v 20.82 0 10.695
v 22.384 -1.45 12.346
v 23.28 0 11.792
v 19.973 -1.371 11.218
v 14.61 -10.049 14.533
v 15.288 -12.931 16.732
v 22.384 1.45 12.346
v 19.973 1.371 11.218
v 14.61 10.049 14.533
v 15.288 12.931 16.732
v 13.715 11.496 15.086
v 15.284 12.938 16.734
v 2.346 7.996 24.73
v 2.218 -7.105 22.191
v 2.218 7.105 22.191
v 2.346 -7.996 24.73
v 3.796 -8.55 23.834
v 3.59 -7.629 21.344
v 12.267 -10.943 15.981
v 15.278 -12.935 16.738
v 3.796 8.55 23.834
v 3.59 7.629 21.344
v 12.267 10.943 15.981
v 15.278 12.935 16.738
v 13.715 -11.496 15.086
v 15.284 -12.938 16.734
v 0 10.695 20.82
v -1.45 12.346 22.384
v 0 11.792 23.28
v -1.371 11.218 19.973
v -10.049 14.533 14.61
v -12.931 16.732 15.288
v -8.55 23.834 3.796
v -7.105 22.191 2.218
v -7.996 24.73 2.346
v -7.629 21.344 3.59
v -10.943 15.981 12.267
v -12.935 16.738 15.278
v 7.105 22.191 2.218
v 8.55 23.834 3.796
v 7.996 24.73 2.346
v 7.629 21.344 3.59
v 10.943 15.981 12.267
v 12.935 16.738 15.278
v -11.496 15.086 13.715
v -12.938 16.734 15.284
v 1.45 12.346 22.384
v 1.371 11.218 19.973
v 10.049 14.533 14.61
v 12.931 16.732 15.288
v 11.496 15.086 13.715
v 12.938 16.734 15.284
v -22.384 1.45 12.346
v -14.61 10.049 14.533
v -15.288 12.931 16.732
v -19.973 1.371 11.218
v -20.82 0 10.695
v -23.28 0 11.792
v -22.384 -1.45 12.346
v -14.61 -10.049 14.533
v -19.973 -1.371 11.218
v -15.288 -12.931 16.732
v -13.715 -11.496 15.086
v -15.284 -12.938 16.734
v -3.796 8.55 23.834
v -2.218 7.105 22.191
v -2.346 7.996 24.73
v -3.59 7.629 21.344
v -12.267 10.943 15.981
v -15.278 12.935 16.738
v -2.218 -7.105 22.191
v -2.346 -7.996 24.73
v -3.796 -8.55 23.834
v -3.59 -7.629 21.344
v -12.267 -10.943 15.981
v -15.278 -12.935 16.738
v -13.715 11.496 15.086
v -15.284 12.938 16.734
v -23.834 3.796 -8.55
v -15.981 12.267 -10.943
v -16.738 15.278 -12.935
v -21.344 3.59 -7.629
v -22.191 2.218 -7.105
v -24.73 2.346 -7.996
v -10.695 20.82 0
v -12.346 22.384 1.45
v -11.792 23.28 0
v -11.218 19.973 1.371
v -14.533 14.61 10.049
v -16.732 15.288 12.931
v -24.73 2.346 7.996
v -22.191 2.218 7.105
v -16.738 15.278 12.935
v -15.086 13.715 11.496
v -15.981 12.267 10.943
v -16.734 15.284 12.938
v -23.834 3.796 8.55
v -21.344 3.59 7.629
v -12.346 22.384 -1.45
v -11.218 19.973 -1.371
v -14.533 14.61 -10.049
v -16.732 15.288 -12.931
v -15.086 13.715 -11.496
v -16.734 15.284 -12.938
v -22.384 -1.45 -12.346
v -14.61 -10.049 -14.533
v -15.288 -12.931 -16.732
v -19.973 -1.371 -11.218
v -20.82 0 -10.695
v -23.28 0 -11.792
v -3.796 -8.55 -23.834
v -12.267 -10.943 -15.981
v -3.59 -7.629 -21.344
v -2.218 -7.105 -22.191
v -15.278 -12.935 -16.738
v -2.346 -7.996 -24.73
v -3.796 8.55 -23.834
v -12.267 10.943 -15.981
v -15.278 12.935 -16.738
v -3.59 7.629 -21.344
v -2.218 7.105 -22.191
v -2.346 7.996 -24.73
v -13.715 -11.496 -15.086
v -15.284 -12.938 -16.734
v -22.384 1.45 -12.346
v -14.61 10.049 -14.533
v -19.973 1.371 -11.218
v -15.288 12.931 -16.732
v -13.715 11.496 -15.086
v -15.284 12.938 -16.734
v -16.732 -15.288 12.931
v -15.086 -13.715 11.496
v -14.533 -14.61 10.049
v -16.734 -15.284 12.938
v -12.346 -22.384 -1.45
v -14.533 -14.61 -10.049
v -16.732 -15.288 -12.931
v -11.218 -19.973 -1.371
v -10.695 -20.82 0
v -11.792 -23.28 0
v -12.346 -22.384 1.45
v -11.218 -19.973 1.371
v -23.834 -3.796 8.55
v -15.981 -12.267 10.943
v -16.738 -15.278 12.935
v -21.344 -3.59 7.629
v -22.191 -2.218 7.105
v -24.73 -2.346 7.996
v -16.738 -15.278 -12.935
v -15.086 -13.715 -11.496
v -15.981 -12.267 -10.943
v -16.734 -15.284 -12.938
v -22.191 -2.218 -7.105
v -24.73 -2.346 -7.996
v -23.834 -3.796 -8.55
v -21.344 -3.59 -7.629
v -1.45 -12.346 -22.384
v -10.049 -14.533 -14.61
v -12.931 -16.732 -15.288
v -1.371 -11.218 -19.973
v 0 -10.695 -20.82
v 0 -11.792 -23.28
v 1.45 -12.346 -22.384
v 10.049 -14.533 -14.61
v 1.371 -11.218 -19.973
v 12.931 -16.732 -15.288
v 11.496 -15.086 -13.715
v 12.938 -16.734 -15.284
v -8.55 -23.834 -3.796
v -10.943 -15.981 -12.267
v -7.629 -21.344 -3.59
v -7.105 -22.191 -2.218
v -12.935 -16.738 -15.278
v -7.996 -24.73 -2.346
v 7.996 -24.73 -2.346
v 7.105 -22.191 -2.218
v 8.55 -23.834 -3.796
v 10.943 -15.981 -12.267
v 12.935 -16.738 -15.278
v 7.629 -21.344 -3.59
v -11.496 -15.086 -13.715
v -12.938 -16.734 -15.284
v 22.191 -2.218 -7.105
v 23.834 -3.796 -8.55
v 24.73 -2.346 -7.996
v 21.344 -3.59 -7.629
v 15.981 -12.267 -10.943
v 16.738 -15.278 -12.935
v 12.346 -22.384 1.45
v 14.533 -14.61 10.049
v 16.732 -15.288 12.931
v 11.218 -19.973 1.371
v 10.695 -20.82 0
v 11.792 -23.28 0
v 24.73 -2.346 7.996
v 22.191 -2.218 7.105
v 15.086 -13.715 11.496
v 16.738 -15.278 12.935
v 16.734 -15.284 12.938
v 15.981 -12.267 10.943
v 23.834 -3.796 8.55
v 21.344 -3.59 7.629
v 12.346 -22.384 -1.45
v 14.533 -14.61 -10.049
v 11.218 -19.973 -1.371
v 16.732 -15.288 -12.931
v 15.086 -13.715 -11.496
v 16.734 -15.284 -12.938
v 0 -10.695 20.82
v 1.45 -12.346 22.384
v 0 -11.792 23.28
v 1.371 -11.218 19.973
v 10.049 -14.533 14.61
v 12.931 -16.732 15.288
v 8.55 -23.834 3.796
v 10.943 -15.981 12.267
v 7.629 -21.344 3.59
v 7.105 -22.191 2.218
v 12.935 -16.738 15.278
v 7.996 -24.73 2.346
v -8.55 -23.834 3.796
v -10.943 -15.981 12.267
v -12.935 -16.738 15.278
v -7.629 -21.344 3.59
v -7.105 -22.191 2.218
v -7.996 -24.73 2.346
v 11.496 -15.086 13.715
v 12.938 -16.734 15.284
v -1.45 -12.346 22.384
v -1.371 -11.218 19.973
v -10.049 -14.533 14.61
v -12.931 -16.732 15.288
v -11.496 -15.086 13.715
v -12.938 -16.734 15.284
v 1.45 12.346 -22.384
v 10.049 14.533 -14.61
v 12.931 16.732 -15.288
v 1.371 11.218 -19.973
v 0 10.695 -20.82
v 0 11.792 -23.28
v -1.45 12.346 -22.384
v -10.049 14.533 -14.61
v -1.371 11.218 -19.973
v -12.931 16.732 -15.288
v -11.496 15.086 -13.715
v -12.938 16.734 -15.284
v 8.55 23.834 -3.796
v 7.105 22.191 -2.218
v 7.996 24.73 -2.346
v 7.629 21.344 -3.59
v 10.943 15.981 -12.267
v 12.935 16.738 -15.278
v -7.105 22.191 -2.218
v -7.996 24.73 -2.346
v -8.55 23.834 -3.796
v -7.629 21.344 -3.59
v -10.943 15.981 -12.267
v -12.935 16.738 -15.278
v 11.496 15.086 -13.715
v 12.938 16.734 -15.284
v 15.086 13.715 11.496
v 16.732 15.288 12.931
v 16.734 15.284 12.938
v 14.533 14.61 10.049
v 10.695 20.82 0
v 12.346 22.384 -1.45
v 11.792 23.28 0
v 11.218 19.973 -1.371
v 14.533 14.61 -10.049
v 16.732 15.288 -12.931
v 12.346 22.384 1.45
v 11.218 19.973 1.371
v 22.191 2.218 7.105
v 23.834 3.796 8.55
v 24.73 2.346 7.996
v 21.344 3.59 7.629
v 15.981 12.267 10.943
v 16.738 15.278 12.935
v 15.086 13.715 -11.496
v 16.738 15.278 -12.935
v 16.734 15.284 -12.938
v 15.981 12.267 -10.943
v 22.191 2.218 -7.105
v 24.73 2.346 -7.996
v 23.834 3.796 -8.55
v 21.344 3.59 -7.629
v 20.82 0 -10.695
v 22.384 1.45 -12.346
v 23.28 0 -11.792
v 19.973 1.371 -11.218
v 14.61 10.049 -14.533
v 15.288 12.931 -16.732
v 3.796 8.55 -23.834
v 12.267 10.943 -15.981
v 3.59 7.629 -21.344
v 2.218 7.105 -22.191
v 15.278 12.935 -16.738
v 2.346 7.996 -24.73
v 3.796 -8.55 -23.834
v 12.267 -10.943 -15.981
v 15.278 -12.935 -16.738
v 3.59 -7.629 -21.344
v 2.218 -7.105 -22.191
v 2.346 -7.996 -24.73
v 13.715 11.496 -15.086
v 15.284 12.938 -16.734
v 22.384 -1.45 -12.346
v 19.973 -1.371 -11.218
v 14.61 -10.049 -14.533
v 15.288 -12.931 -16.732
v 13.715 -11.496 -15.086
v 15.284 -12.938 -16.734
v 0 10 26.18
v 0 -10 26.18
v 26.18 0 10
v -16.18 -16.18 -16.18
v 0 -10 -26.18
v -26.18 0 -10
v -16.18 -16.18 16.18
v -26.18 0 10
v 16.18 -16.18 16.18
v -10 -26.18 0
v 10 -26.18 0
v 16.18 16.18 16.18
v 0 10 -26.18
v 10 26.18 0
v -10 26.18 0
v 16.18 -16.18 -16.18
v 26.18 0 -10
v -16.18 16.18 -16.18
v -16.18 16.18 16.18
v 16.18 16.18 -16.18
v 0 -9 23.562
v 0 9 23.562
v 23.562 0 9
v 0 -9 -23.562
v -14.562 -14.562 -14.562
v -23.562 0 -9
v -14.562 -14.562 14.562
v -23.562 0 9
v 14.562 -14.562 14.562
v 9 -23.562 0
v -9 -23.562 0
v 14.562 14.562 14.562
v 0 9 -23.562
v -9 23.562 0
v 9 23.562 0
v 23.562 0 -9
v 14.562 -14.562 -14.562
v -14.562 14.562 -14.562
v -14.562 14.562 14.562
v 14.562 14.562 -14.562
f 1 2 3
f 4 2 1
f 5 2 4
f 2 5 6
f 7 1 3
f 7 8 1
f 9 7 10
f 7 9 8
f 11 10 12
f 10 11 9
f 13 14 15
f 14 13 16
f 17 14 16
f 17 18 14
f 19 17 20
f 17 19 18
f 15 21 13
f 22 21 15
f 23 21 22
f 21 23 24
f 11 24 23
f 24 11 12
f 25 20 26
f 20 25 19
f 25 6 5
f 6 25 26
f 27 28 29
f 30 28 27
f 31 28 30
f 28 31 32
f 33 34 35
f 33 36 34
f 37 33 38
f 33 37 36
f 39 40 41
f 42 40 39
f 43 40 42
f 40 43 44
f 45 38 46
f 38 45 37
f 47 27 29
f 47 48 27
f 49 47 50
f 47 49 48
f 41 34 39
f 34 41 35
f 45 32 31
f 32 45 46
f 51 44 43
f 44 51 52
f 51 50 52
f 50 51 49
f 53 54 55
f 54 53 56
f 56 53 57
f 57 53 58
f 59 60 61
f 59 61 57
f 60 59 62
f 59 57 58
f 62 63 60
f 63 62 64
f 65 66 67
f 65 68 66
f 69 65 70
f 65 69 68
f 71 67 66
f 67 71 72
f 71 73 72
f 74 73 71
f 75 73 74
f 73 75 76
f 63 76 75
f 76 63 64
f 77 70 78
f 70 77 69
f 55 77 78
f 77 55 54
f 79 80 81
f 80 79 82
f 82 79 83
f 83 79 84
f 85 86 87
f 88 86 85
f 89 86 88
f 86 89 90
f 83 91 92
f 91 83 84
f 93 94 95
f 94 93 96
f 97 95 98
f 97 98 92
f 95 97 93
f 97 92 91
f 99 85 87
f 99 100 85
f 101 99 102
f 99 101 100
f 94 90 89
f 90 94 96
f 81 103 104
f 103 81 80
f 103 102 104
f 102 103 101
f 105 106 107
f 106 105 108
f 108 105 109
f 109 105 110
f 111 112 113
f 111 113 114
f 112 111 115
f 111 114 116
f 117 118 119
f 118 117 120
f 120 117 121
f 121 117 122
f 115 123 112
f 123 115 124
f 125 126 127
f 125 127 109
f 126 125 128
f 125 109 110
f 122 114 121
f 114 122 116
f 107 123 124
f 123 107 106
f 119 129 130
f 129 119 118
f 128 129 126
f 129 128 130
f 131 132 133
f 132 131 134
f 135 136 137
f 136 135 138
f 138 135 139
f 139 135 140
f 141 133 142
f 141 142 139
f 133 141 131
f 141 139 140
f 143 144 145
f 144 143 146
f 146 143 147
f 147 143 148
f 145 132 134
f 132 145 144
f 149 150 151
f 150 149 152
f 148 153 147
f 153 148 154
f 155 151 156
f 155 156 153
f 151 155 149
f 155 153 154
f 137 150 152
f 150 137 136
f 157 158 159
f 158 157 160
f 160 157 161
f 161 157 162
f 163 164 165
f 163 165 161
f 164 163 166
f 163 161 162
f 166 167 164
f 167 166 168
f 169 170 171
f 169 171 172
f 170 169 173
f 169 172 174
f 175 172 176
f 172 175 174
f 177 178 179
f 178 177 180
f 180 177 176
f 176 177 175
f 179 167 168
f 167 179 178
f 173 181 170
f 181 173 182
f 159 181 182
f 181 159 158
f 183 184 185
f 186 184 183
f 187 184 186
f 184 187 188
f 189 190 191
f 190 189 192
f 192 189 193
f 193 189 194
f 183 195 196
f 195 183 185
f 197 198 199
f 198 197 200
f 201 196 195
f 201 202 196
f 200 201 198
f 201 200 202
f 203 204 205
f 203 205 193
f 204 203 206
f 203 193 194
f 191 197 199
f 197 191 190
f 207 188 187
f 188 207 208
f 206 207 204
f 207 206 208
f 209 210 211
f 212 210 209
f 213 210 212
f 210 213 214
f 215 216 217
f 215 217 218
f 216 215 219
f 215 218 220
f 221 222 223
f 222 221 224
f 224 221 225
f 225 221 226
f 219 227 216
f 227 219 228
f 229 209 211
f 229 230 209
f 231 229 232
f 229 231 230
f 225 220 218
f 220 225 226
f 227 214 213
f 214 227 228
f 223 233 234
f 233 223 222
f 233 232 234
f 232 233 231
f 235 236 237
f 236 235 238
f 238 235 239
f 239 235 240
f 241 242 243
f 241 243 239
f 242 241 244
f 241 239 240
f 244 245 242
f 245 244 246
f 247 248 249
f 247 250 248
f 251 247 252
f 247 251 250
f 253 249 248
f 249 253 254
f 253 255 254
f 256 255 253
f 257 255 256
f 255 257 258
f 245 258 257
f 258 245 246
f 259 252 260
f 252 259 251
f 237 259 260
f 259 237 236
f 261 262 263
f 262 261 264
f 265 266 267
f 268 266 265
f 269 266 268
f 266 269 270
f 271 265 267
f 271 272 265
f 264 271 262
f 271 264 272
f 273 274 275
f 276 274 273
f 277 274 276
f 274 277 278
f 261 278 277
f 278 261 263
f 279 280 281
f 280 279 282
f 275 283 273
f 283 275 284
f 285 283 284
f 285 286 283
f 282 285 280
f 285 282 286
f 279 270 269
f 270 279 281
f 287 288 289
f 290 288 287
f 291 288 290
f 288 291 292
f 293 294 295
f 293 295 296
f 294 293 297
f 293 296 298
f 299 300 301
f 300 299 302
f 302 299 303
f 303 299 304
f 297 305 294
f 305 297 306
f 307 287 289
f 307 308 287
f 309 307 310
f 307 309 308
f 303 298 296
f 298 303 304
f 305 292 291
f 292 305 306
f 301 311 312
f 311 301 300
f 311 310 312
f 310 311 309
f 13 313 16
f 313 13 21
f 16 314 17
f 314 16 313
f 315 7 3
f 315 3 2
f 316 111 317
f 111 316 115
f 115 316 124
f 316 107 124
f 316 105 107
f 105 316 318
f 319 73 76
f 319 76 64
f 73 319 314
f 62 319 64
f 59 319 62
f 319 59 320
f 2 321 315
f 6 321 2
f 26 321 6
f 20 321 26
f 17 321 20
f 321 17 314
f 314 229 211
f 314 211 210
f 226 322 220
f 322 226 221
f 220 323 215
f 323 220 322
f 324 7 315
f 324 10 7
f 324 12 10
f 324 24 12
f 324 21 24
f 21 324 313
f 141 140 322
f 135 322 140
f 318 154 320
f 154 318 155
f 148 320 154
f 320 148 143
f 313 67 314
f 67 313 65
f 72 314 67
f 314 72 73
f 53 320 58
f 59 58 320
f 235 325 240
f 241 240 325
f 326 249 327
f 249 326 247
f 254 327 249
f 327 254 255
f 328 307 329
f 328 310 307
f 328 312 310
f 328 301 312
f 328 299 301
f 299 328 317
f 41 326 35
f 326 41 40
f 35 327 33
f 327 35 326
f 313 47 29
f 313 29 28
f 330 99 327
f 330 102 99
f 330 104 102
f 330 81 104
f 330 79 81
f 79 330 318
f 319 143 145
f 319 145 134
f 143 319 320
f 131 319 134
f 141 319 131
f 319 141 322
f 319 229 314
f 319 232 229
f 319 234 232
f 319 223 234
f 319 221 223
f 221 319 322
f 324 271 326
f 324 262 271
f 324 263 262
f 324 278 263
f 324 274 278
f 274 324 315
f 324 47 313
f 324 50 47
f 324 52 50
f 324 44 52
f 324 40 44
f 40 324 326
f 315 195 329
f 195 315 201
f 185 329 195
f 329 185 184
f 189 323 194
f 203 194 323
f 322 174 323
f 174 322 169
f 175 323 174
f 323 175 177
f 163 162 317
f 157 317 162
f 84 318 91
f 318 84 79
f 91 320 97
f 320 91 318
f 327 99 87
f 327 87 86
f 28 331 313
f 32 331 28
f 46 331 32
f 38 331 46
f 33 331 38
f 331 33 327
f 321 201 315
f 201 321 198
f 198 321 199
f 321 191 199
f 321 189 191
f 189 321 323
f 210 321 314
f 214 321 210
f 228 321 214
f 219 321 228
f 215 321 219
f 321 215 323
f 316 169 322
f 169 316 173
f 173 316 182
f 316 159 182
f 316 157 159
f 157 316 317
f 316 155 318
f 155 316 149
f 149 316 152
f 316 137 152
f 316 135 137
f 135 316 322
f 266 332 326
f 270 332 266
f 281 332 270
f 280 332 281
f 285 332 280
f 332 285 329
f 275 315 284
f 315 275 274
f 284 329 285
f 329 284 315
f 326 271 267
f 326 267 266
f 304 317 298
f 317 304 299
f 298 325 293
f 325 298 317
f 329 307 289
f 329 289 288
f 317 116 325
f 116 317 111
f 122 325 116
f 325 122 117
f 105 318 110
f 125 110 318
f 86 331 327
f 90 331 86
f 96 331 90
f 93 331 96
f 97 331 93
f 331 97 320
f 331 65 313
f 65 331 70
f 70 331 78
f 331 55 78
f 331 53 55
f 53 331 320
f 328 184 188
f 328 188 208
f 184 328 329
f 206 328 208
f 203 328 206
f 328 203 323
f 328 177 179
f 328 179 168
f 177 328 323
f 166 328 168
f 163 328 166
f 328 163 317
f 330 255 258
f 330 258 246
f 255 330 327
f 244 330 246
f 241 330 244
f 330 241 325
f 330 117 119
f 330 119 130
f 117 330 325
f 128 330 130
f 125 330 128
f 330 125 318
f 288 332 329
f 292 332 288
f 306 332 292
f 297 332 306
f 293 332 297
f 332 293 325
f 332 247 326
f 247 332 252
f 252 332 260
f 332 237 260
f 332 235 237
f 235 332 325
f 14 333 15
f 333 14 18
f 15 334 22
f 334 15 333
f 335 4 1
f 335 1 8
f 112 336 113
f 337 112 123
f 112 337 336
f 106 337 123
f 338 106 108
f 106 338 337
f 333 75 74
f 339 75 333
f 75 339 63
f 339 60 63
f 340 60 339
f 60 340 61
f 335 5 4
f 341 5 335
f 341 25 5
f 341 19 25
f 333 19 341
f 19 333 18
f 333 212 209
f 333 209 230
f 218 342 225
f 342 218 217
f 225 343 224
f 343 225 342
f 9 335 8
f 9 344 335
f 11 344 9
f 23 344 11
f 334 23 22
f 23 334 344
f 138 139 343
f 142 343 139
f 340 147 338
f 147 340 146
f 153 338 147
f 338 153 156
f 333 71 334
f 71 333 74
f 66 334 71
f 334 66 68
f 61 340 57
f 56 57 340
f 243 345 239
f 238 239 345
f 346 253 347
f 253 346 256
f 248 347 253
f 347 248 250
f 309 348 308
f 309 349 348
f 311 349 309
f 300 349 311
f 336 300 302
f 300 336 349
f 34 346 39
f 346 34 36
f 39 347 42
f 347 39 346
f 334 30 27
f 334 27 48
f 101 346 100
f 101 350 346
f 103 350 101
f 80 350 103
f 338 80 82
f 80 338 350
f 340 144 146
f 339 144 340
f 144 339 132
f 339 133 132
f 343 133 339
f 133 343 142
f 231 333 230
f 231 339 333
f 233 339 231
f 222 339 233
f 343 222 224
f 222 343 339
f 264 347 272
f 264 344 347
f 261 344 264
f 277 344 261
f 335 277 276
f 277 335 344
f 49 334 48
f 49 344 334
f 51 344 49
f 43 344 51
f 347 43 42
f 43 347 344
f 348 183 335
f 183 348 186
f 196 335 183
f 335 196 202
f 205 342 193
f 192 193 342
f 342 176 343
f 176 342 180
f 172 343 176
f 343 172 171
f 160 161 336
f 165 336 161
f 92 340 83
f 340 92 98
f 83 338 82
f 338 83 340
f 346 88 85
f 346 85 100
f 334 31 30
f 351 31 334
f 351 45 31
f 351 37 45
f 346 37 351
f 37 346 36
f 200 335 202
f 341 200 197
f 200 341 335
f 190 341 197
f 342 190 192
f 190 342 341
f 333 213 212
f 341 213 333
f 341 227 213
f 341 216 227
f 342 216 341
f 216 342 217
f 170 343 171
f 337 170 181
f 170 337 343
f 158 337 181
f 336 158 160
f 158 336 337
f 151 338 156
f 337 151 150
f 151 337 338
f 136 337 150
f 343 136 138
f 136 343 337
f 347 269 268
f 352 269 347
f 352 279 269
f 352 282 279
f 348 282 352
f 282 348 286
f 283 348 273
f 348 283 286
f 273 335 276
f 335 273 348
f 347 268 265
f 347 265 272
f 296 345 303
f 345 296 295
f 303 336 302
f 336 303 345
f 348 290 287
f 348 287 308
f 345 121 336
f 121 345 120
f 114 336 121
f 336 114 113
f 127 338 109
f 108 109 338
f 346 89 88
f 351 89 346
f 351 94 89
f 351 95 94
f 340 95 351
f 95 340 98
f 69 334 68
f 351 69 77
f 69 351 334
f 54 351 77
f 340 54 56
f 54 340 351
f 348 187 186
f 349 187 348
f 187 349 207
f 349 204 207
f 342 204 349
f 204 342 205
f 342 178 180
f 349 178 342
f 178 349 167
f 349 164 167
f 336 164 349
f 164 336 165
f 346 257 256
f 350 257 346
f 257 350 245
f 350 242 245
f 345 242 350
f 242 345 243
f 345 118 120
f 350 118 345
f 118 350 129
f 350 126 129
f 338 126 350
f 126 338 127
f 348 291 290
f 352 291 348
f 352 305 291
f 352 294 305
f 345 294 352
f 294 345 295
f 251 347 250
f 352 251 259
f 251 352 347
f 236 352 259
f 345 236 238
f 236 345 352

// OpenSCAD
// source:  http://dmccooey.com/polyhedra/Dodecahedron.html
// generated by  http://kitwallace.co.uk/3d/solid.xq
Name = "Dodecahedron";
C0 = 0.809016994374947424102293417183;
C1 = 1.30901699437494742410229341718;
points = [
[ 0.0,  0.5,   C1],
[ 0.0,  0.5,  -C1],
[ 0.0, -0.5,   C1],
[ 0.0, -0.5,  -C1],
[  C1,  0.0,  0.5],
[  C1,  0.0, -0.5],
[ -C1,  0.0,  0.5],
[ -C1,  0.0, -0.5],
[ 0.5,   C1,  0.0],
[ 0.5,  -C1,  0.0],
[-0.5,   C1,  0.0],
[-0.5,  -C1,  0.0],
[  C0,   C0,   C0],
[  C0,   C0,  -C0],
[  C0,  -C0,   C0],
[  C0,  -C0,  -C0],
[ -C0,   C0,   C0],
[ -C0,   C0,  -C0],
[ -C0,  -C0,   C0],
[ -C0,  -C0,  -C0]];
faces = [
[ 12 ,  4, 14,  2,  0],
[ 16 , 10,  8, 12,  0],
[  2 , 18,  6, 16,  0],
[ 17 , 10, 16,  6,  7],
[ 19 ,  3,  1, 17,  7],
[  6 , 18, 11, 19,  7],
[ 15 ,  3, 19, 11,  9],
[ 14 ,  4,  5, 15,  9],
[ 11 , 18,  2, 14,  9],
[  8 , 10, 17,  1, 13],
[  5 ,  4, 12,  8, 13],
[  1 ,  3, 15,  5, 13]];
edges = [
[4,12],
[4,14],
[2,14],
[0,2],
[0,12],
[10,16],
[8,10],
[8,12],
[0,16],
[2,18],
[6,18],
[6,16],
[10,17],
[6,7],
[7,17],
[3,19],
[1,3],
[1,17],
[7,19],
[11,18],
[11,19],
[3,15],
[9,11],
[9,15],
[4,5],
[5,15],
[9,14],
[1,13],
[8,13],
[5,13]];
// --------------------------------- 

module locate(p1, p2) {
   assign(p = p2 - p1)
   assign(distance = norm(p)) {   
      translate(p1)
//rotation of XoY plane by the Z axis with the angle of the [p1 p2] line projection with the X axis on the XoY plane
      rotate([0, 0, atan2(p[1], p[0])]) //rotation
//rotation of ZoX plane by the y axis with the angle given by the z coordinate and the sqrt(x^2 + y^2)) point in the XoY plan
      rotate([0, atan2(sqrt(pow(p[0], 2)+pow(p[1], 2)),p[2]), 0])
      children();
  }
}

function m_translate(v) = [ [1, 0, 0, 0],
                            [0, 1, 0, 0],
                            [0, 0, 1, 0],
                            [v.x, v.y, v.z, 1  ] ];
                            
function m_rotate(v) =  [ [1,  0,         0,        0],
                          [0,  cos(v.x),  sin(v.x), 0],
                          [0, -sin(v.x),  cos(v.x), 0],
                          [0,  0,         0,        1] ]
                      * [ [ cos(v.y), 0,  -sin(v.y), 0],
                          [0,         1,  0,        0],
                          [ sin(v.y), 0,  cos(v.y), 0],
                          [0,         0,  0,        1] ]
                      * [ [ cos(v.z),  sin(v.z), 0, 0],
                          [-sin(v.z),  cos(v.z), 0, 0],
                          [ 0,         0,        1, 0],
                          [ 0,         0,        0, 1] ];
                            
function vec3(v) = [v.x, v.y, v.z];
function transform(v, m)  = vec3([v.x, v.y, v.z, 1] * m);
                            
function orientate(p0, p) = 
                       m_rotate([0, atan2(sqrt(pow(p[0], 2) + pow(p[1], 2)), p[2]), 0]) 
                     * m_rotate([0, 0, atan2(p[1], p[0])]) 
                     * m_translate(p0 + p);

function orientate_r(p0, p) = 
                      m_translate(-(p0 + p))
                      * m_rotate([0, 0, -atan2(p[1], p[0])]) 
                      * m_rotate([0, -atan2(sqrt(pow(p[0], 2) + pow(p[1], 2)), p[2]), 0]); 

function transform_points(list, matrix, i = 0) = 
    i < len(list) 
       ? concat([ transform(list[i], matrix) ], transform_points(list, matrix, i + 1))
       : [];

function as_points(ids,points,i=0) =
     i < len(ids) 
        ?  concat([points[ids[i]]], as_points(ids,points,i+1))
        : [];

function normal_r(face) =
     cross(face[1]-face[0],face[2]-face[0]);

function normal(face) =
     - normal_r(face) / norm(normal_r(face));

function centre(points) = 
      vsum(points) / len(points);

function vsum(points,i=0) =
      i < len(points)
        ?  (points[i] + vsum(points,i+1))
        :  [0,0,0];


function vsub(points,v,i=0) =
      i < len(points)
        ?  concat([points[i] - v], vsub(points,v,i+1))
        :  [];

function project(pts,i=0) =
     i < len(pts)
        ? concat([[pts[i][0],pts[i][1]]], project(pts,i+1))
        : [];


module face_prism (face,face_scale,prism_scale,h) {
    assign (n = normal(face), c= centre(face))
    assign (m = orientate_r(c,n))
    assign (tpts =  face_scale * transform_points(face,m))
    assign (xy = project(tpts))
      linear_extrude(height=h,scale=prism_scale) 
          polygon(points=xy);
}

module face_prisms_in(faces,points,face_scale,prism_scale,h) {
    for (i=[0:len(faces) - 1]) 
       assign (f = as_points(faces[i],points)) 
       assign (n = normal(f), c = centre(f))
       locate(c,c+n) 
          translate([0,0,eps]) 
               mirror() rotate([0,180,0]) 
                   face_prism(f,face_scale,prism_scale,h);
}

module face_prisms_out(faces,points,face_scale,prism_scale,h) {
    for (i=[0:len(faces) - 1]) 
       assign (f = as_points(faces[i],points)) 
       assign (n = normal(f), c = centre(f))
       locate(c,c+n) 
          face_prism(f,face_scale,prism_scale,h);
}

eps=0.01;
scale=20;
shell_ratio=0.1;
prism_ratio =0.8;
prism_height=10;
prism_scale=0.5;
spoints = scale * points;

difference() {
    polyhedron(spoints,faces);
    scale(1-shell_ratio) polyhedron(spoints,faces);
    face_prisms_in(faces,spoints,prism_ratio,prism_scale,prism_height);
}
